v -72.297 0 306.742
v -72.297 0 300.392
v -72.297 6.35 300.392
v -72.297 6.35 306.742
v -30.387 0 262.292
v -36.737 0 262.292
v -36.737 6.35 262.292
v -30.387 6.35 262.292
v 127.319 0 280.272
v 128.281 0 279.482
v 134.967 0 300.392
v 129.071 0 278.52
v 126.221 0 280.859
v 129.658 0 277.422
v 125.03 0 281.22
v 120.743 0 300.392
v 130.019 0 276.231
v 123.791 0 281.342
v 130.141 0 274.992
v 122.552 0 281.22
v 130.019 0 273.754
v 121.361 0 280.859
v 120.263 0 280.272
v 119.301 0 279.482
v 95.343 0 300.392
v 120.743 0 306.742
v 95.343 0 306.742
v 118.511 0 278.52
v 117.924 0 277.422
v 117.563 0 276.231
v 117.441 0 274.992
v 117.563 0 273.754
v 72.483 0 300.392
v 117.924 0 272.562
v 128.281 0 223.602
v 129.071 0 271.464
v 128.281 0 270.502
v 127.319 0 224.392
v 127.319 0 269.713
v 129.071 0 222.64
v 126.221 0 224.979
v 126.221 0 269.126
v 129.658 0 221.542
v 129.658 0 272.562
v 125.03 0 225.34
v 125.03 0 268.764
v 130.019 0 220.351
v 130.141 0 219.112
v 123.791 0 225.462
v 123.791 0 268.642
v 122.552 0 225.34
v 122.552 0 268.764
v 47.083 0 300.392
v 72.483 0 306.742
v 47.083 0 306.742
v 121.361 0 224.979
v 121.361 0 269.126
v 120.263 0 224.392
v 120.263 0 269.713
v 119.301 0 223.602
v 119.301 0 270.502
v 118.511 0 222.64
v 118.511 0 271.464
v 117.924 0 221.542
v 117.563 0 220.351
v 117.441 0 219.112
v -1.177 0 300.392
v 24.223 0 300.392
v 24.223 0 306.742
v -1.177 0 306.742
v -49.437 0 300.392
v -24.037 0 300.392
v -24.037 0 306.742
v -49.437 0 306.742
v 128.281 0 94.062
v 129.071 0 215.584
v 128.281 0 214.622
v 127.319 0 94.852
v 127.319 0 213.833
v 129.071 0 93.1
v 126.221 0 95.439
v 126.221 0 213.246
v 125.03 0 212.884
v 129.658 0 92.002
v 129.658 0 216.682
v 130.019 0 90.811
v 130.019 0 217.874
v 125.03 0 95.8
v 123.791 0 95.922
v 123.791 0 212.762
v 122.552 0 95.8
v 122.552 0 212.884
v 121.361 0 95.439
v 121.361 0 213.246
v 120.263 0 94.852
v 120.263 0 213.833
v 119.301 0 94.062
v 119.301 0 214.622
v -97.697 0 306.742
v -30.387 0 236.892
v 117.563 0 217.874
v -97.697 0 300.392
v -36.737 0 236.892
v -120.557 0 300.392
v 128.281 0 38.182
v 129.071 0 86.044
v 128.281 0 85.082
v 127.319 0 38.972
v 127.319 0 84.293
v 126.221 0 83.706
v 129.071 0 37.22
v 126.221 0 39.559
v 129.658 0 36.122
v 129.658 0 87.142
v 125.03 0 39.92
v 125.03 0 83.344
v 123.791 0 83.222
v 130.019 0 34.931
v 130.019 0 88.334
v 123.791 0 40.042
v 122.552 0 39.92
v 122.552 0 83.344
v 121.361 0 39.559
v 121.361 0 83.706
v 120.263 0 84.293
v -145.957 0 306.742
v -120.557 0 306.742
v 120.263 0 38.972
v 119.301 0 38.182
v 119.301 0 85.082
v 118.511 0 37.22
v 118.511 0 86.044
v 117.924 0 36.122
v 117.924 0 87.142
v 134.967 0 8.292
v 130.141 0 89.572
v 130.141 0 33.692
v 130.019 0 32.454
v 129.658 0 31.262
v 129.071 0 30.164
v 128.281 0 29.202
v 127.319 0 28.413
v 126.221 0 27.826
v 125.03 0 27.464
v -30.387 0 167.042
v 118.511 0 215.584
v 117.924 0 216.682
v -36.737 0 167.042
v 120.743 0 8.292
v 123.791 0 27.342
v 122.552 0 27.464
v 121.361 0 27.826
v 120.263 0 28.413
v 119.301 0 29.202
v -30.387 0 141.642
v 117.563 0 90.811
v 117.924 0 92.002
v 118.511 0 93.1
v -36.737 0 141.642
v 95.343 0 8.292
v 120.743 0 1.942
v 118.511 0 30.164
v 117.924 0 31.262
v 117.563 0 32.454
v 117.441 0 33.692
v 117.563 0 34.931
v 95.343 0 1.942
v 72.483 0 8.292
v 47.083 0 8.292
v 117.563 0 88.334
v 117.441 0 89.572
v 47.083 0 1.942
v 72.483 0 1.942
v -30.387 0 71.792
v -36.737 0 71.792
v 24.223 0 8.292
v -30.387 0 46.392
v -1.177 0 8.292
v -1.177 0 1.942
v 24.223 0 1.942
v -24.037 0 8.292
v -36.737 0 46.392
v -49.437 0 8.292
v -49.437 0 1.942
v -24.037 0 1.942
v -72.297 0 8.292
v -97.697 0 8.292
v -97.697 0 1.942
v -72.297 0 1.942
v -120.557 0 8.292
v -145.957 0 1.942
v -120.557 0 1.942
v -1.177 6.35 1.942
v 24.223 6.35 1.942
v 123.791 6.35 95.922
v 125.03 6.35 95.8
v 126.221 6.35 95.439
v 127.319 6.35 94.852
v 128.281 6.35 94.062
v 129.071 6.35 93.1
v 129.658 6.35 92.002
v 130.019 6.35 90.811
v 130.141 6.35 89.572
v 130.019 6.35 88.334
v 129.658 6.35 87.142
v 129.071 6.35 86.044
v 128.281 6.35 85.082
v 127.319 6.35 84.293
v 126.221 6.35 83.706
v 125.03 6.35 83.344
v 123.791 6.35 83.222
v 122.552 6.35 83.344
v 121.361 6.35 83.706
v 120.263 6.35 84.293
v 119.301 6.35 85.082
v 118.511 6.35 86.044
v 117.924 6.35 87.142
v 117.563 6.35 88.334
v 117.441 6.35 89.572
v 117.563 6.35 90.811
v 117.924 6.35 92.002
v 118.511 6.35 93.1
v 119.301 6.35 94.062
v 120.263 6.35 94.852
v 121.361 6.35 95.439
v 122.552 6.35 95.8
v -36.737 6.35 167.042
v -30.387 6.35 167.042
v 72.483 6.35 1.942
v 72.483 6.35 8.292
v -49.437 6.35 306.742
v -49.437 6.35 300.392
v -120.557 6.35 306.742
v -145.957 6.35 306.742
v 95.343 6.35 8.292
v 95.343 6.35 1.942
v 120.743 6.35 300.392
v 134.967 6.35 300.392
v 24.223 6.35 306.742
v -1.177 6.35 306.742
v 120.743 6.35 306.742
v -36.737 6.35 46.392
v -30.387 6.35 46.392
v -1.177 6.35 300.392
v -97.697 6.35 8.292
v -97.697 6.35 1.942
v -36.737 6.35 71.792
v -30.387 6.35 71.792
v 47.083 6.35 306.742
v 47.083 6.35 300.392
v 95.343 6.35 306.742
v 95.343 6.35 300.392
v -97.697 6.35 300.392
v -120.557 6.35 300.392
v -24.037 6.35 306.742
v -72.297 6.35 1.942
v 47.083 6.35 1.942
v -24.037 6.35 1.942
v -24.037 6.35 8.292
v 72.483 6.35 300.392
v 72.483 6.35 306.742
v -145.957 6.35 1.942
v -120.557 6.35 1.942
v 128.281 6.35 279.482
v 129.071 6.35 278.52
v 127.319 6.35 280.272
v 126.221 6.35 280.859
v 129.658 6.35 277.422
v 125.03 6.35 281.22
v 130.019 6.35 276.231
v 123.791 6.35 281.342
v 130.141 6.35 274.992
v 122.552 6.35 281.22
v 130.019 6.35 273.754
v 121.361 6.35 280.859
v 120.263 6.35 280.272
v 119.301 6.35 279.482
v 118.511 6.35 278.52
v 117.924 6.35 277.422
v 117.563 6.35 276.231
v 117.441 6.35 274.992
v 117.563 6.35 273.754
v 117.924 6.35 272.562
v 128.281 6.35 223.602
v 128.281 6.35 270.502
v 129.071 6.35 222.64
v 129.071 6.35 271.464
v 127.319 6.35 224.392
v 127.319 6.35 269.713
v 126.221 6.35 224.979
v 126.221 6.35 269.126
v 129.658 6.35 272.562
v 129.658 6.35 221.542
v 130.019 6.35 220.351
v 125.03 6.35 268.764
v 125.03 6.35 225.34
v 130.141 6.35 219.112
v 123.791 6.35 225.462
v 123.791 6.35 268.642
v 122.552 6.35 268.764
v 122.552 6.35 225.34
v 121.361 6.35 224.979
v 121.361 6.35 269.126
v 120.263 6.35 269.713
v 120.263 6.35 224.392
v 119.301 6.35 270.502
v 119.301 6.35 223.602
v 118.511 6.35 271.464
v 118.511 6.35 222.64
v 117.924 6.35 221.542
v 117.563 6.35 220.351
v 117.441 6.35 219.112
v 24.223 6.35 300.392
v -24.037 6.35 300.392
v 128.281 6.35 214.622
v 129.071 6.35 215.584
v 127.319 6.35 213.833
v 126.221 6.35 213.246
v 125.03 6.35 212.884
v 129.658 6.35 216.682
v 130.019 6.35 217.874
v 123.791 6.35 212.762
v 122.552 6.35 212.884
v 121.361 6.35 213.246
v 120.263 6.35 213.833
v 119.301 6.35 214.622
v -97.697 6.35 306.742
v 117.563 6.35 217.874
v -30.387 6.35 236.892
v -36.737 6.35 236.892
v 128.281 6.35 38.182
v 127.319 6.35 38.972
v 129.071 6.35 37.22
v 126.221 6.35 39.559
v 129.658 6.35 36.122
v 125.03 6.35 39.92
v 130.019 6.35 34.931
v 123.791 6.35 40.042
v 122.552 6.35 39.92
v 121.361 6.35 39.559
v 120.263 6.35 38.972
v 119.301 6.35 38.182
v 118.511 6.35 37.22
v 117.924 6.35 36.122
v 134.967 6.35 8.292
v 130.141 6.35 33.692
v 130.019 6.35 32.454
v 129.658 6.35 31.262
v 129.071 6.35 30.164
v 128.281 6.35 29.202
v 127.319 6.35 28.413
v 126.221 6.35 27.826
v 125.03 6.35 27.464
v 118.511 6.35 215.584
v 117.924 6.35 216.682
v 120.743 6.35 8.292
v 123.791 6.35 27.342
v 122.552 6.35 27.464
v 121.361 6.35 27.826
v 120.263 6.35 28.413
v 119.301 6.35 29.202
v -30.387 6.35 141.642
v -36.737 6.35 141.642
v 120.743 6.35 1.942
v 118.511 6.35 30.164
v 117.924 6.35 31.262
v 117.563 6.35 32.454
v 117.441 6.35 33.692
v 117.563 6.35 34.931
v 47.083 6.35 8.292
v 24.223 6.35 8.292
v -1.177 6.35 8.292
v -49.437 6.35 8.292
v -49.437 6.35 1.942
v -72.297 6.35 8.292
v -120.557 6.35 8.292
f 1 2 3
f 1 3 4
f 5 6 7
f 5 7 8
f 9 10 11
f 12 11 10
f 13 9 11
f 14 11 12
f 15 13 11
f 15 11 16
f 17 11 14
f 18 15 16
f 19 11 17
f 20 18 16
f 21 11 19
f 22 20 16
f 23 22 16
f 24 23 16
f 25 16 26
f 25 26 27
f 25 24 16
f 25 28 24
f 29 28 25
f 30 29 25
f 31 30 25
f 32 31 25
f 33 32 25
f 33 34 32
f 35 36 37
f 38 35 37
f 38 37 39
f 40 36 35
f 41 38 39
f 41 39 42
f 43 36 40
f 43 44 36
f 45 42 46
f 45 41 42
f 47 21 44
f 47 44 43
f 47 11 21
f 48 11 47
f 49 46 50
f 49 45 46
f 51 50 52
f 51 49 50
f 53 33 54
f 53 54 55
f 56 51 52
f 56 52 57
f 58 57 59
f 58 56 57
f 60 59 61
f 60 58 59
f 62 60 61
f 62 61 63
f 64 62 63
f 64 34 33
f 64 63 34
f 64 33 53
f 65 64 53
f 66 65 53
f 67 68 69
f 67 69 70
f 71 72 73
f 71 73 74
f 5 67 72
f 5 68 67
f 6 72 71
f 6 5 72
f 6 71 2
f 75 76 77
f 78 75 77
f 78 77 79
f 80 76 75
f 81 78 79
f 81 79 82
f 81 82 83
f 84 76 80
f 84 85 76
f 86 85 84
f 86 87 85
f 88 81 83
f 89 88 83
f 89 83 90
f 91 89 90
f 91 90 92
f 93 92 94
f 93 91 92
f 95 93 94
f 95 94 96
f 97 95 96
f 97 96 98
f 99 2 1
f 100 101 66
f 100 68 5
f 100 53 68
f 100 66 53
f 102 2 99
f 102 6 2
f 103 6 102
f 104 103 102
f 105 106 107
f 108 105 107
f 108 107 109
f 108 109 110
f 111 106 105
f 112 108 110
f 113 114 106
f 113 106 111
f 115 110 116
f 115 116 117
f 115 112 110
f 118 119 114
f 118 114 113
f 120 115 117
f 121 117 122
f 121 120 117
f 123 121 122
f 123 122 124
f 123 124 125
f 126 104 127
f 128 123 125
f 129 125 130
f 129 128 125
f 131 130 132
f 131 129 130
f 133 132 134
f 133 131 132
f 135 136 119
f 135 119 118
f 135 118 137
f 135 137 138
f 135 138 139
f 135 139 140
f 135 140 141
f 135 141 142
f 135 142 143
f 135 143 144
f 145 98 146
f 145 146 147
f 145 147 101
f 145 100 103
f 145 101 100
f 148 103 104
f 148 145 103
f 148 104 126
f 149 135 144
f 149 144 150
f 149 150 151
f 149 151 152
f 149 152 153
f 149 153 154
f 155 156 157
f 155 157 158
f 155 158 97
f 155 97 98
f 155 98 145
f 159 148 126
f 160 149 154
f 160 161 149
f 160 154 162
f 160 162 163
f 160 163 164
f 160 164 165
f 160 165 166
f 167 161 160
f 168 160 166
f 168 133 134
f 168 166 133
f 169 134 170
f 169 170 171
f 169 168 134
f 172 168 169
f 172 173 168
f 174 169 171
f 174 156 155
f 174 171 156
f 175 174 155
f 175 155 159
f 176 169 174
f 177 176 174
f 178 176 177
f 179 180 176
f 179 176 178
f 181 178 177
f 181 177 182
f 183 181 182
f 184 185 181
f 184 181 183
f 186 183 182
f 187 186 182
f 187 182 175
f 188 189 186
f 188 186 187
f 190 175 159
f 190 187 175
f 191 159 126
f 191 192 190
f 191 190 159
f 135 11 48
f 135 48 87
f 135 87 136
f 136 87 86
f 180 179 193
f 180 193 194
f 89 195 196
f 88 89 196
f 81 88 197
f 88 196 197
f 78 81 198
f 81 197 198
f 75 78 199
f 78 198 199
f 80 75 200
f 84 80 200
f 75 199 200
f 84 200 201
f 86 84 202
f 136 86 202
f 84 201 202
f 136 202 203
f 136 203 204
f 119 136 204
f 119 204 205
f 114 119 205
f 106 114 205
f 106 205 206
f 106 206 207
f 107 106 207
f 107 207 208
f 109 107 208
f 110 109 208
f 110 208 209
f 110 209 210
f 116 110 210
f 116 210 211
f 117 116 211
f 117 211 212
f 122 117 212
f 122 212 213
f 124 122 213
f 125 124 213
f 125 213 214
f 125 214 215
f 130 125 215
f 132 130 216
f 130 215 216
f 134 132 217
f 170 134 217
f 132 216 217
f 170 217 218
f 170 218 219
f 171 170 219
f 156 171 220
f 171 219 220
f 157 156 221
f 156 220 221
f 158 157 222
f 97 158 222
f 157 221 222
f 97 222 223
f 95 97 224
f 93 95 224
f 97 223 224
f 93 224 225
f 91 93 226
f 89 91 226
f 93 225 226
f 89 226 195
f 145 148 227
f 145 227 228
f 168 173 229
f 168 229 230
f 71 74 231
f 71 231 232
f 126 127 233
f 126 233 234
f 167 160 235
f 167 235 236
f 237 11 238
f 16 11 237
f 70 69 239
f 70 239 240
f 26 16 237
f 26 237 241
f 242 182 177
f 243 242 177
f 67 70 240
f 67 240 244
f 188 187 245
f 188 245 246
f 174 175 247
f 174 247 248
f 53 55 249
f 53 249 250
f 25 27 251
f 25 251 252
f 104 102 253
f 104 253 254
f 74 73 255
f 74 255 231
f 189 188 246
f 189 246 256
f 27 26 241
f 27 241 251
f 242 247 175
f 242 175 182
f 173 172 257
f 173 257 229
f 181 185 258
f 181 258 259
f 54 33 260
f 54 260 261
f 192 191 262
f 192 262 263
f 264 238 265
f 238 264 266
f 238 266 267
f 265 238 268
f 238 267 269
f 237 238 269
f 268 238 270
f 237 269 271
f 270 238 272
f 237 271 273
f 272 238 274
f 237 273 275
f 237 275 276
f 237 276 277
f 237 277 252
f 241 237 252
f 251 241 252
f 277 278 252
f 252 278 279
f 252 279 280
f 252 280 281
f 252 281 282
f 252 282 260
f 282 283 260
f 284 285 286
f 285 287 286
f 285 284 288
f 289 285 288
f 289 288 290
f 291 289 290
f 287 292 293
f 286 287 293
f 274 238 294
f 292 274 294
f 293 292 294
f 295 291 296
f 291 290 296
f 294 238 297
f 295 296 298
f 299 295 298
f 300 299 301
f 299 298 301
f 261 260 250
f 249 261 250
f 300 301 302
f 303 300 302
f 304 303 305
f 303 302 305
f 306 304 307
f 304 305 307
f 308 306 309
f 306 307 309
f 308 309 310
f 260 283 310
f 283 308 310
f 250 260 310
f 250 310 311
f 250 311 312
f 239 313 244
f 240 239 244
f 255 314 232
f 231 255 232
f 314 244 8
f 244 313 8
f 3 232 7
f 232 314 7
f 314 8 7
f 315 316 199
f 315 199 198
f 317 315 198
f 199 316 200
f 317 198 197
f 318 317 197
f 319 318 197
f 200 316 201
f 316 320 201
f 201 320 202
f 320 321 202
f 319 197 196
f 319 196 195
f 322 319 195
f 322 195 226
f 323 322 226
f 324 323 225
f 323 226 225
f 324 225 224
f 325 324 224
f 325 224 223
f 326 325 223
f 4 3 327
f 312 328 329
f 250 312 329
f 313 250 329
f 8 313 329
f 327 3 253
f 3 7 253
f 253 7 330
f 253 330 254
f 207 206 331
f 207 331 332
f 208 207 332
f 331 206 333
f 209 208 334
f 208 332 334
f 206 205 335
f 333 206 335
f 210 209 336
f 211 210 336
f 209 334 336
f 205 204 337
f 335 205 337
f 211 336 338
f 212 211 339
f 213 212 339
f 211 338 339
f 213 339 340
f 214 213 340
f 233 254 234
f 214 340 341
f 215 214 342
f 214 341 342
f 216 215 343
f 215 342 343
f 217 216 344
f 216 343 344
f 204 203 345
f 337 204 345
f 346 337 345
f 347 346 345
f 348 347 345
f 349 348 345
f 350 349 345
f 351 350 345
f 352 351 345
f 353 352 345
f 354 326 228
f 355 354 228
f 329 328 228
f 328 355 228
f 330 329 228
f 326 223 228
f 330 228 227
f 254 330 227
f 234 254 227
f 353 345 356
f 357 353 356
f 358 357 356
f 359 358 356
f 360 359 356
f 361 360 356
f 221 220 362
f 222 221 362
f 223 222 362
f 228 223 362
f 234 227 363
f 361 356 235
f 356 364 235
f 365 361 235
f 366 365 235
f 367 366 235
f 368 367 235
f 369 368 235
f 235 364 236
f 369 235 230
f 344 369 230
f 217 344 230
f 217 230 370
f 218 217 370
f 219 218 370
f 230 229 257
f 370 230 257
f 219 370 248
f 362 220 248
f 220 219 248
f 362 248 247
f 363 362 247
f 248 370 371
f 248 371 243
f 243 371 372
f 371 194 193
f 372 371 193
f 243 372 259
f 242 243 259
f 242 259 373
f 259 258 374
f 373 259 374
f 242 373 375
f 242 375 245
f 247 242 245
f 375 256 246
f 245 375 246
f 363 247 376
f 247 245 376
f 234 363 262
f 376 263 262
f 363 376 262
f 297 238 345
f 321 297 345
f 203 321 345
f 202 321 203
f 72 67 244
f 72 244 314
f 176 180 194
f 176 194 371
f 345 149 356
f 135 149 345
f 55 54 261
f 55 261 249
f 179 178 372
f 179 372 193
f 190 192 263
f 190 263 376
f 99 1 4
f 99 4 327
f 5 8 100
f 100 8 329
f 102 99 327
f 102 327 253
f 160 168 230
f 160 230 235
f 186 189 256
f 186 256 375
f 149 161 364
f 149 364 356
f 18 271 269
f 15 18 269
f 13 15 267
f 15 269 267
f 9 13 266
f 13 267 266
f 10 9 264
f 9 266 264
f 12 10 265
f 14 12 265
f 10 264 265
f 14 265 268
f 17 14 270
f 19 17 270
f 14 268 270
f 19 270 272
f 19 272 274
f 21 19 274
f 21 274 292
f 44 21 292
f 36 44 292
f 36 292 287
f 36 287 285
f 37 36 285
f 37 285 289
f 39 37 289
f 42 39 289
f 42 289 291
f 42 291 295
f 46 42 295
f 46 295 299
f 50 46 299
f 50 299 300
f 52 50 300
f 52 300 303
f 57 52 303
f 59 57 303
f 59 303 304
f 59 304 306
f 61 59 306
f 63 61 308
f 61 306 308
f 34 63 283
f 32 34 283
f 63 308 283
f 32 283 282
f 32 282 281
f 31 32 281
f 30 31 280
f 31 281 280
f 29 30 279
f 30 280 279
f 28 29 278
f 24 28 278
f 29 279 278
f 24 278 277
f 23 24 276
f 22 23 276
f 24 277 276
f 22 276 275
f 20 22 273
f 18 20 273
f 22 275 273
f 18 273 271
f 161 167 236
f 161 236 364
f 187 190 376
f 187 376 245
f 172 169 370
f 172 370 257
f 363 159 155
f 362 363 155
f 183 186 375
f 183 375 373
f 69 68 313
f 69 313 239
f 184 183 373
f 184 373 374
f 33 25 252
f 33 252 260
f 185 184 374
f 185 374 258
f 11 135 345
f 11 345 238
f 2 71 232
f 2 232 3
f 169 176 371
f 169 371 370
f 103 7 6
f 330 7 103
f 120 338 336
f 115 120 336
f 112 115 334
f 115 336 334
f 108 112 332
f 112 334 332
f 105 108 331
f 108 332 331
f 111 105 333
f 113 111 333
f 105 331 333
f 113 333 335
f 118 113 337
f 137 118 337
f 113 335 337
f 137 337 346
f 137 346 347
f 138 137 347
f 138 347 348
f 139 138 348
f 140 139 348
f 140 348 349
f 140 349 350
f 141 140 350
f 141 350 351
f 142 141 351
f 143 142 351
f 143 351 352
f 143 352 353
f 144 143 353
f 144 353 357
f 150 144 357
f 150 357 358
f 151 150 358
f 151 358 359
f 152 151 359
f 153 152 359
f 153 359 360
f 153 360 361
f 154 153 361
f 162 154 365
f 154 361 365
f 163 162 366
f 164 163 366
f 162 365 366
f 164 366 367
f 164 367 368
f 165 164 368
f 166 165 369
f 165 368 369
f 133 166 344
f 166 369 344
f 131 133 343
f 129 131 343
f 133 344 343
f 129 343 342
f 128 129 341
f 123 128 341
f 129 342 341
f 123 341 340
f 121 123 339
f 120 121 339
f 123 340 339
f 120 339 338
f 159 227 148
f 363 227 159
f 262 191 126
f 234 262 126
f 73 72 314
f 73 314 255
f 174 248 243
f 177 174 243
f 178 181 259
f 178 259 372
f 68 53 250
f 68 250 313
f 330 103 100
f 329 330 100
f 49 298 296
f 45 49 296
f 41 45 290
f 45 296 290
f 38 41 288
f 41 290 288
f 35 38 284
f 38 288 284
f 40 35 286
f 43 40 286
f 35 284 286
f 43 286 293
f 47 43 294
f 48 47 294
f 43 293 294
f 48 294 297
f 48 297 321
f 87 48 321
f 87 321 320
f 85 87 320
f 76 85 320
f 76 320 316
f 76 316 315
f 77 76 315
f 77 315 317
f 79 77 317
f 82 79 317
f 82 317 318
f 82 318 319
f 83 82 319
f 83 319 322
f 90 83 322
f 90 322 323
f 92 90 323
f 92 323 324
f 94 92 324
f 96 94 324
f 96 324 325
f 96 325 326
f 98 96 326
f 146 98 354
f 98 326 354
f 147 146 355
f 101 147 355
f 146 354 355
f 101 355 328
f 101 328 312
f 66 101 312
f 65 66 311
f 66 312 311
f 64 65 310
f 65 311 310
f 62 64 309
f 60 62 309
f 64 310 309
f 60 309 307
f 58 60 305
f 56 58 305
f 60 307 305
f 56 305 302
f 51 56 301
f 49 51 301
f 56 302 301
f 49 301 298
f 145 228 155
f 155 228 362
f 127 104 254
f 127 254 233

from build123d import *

# Parameters (mm, degrees)
BOSS_EXTRUDE1_DEPTH = 6.35
SKETCH2_R           = 6.35
SKETCH2_W           = 6.35
SKETCH2_H           = 25.4
CUT_EXTRUDE1_DEPTH  = 340.756694235


with BuildPart() as part:
    # Sketch1 → Boss-Extrude1 (new body)
    with BuildSketch(Plane(origin=(0, 0, 0), x_dir=(1, 0, 0), z_dir=(0, 1, 0))):
        Polygon((-97.696931278, -1.942339741), (-72.296931278, -1.942339741), (-72.296931278, -8.292339741), (-49.436931278, -8.292339741), (-49.436931278, -1.942339741), (-24.036931278, -1.942339741), (-24.036931278, -8.292339741), (-1.176931278, -8.292339741), (-1.176931278, -1.942339741), (24.223068722, -1.942339741), (24.223068722, -8.292339741), (47.083068722, -8.292339741), (47.083068722, -1.942339741), (72.483068722, -1.942339741), (72.483068722, -8.292339741), (95.343068722, -8.292339741), (95.343068722, -1.942339741), (120.743068722, -1.942339741), (120.743068722, -8.292339741), (134.967068722, -8.292339741), (134.967068722, -300.392339741), (120.743068722, -300.392339741), (120.743068722, -306.742339741), (95.343068722, -306.742339741), (95.343068722, -300.392339741), (72.483068722, -300.392339741), (72.483068722, -306.742339741), (47.083068722, -306.742339741), (47.083068722, -300.392339741), (24.223068722, -300.392339741), (24.223068722, -306.742339741), (-1.176931278, -306.742339741), (-1.176931278, -300.392339741), (-24.036931278, -300.392339741), (-24.036931278, -306.742339741), (-49.436931278, -306.742339741), (-49.436931278, -300.392339741), (-72.296931278, -300.392339741), (-72.296931278, -306.742339741), (-97.696931278, -306.742339741), (-97.696931278, -300.392339741), (-120.556931278, -300.392339741), (-120.556931278, -306.742339741), (-145.956931278, -306.742339741), (-145.956931278, -300.392339741), (-145.956931278, -8.292339741), (-145.956931278, -1.942339741), (-120.556931278, -1.942339741), (-120.556931278, -8.292339741), (-97.696931278, -8.292339741), align=None)
    extrude(amount=BOSS_EXTRUDE1_DEPTH)

    # Sketch2 → Cut-Extrude1 (cut, through all)
    with BuildSketch(Plane(origin=(0, 6.35, 0), x_dir=(1, 0, 0), z_dir=(0, 1, 0))):
        with Locations(Location((123.791068722, -274.992339741, 0), (0, 0, 270))):
            Circle(SKETCH2_R)
        with Locations(Location((123.791068722, -33.692339741, 0), (0, 0, 270))):
            Circle(SKETCH2_R)
        with Locations(Location((123.791068722, -89.572339741, 0), (0, 0, 270))):
            Circle(SKETCH2_R)
        with Locations(Location((123.791068722, -219.112339741, 0), (0, 0, 270))):
            Circle(SKETCH2_R)
        with Locations((-33.561931278, -59.092339741)):
            Rectangle(SKETCH2_W, SKETCH2_H)
        with Locations((-33.561931278, -249.592339741)):
            Rectangle(SKETCH2_W, SKETCH2_H)
        with Locations((-33.561931278, -154.342339741)):
            Rectangle(SKETCH2_W, SKETCH2_H)
    extrude(amount=-CUT_EXTRUDE1_DEPTH, mode=Mode.SUBTRACT)


solid = part.part
